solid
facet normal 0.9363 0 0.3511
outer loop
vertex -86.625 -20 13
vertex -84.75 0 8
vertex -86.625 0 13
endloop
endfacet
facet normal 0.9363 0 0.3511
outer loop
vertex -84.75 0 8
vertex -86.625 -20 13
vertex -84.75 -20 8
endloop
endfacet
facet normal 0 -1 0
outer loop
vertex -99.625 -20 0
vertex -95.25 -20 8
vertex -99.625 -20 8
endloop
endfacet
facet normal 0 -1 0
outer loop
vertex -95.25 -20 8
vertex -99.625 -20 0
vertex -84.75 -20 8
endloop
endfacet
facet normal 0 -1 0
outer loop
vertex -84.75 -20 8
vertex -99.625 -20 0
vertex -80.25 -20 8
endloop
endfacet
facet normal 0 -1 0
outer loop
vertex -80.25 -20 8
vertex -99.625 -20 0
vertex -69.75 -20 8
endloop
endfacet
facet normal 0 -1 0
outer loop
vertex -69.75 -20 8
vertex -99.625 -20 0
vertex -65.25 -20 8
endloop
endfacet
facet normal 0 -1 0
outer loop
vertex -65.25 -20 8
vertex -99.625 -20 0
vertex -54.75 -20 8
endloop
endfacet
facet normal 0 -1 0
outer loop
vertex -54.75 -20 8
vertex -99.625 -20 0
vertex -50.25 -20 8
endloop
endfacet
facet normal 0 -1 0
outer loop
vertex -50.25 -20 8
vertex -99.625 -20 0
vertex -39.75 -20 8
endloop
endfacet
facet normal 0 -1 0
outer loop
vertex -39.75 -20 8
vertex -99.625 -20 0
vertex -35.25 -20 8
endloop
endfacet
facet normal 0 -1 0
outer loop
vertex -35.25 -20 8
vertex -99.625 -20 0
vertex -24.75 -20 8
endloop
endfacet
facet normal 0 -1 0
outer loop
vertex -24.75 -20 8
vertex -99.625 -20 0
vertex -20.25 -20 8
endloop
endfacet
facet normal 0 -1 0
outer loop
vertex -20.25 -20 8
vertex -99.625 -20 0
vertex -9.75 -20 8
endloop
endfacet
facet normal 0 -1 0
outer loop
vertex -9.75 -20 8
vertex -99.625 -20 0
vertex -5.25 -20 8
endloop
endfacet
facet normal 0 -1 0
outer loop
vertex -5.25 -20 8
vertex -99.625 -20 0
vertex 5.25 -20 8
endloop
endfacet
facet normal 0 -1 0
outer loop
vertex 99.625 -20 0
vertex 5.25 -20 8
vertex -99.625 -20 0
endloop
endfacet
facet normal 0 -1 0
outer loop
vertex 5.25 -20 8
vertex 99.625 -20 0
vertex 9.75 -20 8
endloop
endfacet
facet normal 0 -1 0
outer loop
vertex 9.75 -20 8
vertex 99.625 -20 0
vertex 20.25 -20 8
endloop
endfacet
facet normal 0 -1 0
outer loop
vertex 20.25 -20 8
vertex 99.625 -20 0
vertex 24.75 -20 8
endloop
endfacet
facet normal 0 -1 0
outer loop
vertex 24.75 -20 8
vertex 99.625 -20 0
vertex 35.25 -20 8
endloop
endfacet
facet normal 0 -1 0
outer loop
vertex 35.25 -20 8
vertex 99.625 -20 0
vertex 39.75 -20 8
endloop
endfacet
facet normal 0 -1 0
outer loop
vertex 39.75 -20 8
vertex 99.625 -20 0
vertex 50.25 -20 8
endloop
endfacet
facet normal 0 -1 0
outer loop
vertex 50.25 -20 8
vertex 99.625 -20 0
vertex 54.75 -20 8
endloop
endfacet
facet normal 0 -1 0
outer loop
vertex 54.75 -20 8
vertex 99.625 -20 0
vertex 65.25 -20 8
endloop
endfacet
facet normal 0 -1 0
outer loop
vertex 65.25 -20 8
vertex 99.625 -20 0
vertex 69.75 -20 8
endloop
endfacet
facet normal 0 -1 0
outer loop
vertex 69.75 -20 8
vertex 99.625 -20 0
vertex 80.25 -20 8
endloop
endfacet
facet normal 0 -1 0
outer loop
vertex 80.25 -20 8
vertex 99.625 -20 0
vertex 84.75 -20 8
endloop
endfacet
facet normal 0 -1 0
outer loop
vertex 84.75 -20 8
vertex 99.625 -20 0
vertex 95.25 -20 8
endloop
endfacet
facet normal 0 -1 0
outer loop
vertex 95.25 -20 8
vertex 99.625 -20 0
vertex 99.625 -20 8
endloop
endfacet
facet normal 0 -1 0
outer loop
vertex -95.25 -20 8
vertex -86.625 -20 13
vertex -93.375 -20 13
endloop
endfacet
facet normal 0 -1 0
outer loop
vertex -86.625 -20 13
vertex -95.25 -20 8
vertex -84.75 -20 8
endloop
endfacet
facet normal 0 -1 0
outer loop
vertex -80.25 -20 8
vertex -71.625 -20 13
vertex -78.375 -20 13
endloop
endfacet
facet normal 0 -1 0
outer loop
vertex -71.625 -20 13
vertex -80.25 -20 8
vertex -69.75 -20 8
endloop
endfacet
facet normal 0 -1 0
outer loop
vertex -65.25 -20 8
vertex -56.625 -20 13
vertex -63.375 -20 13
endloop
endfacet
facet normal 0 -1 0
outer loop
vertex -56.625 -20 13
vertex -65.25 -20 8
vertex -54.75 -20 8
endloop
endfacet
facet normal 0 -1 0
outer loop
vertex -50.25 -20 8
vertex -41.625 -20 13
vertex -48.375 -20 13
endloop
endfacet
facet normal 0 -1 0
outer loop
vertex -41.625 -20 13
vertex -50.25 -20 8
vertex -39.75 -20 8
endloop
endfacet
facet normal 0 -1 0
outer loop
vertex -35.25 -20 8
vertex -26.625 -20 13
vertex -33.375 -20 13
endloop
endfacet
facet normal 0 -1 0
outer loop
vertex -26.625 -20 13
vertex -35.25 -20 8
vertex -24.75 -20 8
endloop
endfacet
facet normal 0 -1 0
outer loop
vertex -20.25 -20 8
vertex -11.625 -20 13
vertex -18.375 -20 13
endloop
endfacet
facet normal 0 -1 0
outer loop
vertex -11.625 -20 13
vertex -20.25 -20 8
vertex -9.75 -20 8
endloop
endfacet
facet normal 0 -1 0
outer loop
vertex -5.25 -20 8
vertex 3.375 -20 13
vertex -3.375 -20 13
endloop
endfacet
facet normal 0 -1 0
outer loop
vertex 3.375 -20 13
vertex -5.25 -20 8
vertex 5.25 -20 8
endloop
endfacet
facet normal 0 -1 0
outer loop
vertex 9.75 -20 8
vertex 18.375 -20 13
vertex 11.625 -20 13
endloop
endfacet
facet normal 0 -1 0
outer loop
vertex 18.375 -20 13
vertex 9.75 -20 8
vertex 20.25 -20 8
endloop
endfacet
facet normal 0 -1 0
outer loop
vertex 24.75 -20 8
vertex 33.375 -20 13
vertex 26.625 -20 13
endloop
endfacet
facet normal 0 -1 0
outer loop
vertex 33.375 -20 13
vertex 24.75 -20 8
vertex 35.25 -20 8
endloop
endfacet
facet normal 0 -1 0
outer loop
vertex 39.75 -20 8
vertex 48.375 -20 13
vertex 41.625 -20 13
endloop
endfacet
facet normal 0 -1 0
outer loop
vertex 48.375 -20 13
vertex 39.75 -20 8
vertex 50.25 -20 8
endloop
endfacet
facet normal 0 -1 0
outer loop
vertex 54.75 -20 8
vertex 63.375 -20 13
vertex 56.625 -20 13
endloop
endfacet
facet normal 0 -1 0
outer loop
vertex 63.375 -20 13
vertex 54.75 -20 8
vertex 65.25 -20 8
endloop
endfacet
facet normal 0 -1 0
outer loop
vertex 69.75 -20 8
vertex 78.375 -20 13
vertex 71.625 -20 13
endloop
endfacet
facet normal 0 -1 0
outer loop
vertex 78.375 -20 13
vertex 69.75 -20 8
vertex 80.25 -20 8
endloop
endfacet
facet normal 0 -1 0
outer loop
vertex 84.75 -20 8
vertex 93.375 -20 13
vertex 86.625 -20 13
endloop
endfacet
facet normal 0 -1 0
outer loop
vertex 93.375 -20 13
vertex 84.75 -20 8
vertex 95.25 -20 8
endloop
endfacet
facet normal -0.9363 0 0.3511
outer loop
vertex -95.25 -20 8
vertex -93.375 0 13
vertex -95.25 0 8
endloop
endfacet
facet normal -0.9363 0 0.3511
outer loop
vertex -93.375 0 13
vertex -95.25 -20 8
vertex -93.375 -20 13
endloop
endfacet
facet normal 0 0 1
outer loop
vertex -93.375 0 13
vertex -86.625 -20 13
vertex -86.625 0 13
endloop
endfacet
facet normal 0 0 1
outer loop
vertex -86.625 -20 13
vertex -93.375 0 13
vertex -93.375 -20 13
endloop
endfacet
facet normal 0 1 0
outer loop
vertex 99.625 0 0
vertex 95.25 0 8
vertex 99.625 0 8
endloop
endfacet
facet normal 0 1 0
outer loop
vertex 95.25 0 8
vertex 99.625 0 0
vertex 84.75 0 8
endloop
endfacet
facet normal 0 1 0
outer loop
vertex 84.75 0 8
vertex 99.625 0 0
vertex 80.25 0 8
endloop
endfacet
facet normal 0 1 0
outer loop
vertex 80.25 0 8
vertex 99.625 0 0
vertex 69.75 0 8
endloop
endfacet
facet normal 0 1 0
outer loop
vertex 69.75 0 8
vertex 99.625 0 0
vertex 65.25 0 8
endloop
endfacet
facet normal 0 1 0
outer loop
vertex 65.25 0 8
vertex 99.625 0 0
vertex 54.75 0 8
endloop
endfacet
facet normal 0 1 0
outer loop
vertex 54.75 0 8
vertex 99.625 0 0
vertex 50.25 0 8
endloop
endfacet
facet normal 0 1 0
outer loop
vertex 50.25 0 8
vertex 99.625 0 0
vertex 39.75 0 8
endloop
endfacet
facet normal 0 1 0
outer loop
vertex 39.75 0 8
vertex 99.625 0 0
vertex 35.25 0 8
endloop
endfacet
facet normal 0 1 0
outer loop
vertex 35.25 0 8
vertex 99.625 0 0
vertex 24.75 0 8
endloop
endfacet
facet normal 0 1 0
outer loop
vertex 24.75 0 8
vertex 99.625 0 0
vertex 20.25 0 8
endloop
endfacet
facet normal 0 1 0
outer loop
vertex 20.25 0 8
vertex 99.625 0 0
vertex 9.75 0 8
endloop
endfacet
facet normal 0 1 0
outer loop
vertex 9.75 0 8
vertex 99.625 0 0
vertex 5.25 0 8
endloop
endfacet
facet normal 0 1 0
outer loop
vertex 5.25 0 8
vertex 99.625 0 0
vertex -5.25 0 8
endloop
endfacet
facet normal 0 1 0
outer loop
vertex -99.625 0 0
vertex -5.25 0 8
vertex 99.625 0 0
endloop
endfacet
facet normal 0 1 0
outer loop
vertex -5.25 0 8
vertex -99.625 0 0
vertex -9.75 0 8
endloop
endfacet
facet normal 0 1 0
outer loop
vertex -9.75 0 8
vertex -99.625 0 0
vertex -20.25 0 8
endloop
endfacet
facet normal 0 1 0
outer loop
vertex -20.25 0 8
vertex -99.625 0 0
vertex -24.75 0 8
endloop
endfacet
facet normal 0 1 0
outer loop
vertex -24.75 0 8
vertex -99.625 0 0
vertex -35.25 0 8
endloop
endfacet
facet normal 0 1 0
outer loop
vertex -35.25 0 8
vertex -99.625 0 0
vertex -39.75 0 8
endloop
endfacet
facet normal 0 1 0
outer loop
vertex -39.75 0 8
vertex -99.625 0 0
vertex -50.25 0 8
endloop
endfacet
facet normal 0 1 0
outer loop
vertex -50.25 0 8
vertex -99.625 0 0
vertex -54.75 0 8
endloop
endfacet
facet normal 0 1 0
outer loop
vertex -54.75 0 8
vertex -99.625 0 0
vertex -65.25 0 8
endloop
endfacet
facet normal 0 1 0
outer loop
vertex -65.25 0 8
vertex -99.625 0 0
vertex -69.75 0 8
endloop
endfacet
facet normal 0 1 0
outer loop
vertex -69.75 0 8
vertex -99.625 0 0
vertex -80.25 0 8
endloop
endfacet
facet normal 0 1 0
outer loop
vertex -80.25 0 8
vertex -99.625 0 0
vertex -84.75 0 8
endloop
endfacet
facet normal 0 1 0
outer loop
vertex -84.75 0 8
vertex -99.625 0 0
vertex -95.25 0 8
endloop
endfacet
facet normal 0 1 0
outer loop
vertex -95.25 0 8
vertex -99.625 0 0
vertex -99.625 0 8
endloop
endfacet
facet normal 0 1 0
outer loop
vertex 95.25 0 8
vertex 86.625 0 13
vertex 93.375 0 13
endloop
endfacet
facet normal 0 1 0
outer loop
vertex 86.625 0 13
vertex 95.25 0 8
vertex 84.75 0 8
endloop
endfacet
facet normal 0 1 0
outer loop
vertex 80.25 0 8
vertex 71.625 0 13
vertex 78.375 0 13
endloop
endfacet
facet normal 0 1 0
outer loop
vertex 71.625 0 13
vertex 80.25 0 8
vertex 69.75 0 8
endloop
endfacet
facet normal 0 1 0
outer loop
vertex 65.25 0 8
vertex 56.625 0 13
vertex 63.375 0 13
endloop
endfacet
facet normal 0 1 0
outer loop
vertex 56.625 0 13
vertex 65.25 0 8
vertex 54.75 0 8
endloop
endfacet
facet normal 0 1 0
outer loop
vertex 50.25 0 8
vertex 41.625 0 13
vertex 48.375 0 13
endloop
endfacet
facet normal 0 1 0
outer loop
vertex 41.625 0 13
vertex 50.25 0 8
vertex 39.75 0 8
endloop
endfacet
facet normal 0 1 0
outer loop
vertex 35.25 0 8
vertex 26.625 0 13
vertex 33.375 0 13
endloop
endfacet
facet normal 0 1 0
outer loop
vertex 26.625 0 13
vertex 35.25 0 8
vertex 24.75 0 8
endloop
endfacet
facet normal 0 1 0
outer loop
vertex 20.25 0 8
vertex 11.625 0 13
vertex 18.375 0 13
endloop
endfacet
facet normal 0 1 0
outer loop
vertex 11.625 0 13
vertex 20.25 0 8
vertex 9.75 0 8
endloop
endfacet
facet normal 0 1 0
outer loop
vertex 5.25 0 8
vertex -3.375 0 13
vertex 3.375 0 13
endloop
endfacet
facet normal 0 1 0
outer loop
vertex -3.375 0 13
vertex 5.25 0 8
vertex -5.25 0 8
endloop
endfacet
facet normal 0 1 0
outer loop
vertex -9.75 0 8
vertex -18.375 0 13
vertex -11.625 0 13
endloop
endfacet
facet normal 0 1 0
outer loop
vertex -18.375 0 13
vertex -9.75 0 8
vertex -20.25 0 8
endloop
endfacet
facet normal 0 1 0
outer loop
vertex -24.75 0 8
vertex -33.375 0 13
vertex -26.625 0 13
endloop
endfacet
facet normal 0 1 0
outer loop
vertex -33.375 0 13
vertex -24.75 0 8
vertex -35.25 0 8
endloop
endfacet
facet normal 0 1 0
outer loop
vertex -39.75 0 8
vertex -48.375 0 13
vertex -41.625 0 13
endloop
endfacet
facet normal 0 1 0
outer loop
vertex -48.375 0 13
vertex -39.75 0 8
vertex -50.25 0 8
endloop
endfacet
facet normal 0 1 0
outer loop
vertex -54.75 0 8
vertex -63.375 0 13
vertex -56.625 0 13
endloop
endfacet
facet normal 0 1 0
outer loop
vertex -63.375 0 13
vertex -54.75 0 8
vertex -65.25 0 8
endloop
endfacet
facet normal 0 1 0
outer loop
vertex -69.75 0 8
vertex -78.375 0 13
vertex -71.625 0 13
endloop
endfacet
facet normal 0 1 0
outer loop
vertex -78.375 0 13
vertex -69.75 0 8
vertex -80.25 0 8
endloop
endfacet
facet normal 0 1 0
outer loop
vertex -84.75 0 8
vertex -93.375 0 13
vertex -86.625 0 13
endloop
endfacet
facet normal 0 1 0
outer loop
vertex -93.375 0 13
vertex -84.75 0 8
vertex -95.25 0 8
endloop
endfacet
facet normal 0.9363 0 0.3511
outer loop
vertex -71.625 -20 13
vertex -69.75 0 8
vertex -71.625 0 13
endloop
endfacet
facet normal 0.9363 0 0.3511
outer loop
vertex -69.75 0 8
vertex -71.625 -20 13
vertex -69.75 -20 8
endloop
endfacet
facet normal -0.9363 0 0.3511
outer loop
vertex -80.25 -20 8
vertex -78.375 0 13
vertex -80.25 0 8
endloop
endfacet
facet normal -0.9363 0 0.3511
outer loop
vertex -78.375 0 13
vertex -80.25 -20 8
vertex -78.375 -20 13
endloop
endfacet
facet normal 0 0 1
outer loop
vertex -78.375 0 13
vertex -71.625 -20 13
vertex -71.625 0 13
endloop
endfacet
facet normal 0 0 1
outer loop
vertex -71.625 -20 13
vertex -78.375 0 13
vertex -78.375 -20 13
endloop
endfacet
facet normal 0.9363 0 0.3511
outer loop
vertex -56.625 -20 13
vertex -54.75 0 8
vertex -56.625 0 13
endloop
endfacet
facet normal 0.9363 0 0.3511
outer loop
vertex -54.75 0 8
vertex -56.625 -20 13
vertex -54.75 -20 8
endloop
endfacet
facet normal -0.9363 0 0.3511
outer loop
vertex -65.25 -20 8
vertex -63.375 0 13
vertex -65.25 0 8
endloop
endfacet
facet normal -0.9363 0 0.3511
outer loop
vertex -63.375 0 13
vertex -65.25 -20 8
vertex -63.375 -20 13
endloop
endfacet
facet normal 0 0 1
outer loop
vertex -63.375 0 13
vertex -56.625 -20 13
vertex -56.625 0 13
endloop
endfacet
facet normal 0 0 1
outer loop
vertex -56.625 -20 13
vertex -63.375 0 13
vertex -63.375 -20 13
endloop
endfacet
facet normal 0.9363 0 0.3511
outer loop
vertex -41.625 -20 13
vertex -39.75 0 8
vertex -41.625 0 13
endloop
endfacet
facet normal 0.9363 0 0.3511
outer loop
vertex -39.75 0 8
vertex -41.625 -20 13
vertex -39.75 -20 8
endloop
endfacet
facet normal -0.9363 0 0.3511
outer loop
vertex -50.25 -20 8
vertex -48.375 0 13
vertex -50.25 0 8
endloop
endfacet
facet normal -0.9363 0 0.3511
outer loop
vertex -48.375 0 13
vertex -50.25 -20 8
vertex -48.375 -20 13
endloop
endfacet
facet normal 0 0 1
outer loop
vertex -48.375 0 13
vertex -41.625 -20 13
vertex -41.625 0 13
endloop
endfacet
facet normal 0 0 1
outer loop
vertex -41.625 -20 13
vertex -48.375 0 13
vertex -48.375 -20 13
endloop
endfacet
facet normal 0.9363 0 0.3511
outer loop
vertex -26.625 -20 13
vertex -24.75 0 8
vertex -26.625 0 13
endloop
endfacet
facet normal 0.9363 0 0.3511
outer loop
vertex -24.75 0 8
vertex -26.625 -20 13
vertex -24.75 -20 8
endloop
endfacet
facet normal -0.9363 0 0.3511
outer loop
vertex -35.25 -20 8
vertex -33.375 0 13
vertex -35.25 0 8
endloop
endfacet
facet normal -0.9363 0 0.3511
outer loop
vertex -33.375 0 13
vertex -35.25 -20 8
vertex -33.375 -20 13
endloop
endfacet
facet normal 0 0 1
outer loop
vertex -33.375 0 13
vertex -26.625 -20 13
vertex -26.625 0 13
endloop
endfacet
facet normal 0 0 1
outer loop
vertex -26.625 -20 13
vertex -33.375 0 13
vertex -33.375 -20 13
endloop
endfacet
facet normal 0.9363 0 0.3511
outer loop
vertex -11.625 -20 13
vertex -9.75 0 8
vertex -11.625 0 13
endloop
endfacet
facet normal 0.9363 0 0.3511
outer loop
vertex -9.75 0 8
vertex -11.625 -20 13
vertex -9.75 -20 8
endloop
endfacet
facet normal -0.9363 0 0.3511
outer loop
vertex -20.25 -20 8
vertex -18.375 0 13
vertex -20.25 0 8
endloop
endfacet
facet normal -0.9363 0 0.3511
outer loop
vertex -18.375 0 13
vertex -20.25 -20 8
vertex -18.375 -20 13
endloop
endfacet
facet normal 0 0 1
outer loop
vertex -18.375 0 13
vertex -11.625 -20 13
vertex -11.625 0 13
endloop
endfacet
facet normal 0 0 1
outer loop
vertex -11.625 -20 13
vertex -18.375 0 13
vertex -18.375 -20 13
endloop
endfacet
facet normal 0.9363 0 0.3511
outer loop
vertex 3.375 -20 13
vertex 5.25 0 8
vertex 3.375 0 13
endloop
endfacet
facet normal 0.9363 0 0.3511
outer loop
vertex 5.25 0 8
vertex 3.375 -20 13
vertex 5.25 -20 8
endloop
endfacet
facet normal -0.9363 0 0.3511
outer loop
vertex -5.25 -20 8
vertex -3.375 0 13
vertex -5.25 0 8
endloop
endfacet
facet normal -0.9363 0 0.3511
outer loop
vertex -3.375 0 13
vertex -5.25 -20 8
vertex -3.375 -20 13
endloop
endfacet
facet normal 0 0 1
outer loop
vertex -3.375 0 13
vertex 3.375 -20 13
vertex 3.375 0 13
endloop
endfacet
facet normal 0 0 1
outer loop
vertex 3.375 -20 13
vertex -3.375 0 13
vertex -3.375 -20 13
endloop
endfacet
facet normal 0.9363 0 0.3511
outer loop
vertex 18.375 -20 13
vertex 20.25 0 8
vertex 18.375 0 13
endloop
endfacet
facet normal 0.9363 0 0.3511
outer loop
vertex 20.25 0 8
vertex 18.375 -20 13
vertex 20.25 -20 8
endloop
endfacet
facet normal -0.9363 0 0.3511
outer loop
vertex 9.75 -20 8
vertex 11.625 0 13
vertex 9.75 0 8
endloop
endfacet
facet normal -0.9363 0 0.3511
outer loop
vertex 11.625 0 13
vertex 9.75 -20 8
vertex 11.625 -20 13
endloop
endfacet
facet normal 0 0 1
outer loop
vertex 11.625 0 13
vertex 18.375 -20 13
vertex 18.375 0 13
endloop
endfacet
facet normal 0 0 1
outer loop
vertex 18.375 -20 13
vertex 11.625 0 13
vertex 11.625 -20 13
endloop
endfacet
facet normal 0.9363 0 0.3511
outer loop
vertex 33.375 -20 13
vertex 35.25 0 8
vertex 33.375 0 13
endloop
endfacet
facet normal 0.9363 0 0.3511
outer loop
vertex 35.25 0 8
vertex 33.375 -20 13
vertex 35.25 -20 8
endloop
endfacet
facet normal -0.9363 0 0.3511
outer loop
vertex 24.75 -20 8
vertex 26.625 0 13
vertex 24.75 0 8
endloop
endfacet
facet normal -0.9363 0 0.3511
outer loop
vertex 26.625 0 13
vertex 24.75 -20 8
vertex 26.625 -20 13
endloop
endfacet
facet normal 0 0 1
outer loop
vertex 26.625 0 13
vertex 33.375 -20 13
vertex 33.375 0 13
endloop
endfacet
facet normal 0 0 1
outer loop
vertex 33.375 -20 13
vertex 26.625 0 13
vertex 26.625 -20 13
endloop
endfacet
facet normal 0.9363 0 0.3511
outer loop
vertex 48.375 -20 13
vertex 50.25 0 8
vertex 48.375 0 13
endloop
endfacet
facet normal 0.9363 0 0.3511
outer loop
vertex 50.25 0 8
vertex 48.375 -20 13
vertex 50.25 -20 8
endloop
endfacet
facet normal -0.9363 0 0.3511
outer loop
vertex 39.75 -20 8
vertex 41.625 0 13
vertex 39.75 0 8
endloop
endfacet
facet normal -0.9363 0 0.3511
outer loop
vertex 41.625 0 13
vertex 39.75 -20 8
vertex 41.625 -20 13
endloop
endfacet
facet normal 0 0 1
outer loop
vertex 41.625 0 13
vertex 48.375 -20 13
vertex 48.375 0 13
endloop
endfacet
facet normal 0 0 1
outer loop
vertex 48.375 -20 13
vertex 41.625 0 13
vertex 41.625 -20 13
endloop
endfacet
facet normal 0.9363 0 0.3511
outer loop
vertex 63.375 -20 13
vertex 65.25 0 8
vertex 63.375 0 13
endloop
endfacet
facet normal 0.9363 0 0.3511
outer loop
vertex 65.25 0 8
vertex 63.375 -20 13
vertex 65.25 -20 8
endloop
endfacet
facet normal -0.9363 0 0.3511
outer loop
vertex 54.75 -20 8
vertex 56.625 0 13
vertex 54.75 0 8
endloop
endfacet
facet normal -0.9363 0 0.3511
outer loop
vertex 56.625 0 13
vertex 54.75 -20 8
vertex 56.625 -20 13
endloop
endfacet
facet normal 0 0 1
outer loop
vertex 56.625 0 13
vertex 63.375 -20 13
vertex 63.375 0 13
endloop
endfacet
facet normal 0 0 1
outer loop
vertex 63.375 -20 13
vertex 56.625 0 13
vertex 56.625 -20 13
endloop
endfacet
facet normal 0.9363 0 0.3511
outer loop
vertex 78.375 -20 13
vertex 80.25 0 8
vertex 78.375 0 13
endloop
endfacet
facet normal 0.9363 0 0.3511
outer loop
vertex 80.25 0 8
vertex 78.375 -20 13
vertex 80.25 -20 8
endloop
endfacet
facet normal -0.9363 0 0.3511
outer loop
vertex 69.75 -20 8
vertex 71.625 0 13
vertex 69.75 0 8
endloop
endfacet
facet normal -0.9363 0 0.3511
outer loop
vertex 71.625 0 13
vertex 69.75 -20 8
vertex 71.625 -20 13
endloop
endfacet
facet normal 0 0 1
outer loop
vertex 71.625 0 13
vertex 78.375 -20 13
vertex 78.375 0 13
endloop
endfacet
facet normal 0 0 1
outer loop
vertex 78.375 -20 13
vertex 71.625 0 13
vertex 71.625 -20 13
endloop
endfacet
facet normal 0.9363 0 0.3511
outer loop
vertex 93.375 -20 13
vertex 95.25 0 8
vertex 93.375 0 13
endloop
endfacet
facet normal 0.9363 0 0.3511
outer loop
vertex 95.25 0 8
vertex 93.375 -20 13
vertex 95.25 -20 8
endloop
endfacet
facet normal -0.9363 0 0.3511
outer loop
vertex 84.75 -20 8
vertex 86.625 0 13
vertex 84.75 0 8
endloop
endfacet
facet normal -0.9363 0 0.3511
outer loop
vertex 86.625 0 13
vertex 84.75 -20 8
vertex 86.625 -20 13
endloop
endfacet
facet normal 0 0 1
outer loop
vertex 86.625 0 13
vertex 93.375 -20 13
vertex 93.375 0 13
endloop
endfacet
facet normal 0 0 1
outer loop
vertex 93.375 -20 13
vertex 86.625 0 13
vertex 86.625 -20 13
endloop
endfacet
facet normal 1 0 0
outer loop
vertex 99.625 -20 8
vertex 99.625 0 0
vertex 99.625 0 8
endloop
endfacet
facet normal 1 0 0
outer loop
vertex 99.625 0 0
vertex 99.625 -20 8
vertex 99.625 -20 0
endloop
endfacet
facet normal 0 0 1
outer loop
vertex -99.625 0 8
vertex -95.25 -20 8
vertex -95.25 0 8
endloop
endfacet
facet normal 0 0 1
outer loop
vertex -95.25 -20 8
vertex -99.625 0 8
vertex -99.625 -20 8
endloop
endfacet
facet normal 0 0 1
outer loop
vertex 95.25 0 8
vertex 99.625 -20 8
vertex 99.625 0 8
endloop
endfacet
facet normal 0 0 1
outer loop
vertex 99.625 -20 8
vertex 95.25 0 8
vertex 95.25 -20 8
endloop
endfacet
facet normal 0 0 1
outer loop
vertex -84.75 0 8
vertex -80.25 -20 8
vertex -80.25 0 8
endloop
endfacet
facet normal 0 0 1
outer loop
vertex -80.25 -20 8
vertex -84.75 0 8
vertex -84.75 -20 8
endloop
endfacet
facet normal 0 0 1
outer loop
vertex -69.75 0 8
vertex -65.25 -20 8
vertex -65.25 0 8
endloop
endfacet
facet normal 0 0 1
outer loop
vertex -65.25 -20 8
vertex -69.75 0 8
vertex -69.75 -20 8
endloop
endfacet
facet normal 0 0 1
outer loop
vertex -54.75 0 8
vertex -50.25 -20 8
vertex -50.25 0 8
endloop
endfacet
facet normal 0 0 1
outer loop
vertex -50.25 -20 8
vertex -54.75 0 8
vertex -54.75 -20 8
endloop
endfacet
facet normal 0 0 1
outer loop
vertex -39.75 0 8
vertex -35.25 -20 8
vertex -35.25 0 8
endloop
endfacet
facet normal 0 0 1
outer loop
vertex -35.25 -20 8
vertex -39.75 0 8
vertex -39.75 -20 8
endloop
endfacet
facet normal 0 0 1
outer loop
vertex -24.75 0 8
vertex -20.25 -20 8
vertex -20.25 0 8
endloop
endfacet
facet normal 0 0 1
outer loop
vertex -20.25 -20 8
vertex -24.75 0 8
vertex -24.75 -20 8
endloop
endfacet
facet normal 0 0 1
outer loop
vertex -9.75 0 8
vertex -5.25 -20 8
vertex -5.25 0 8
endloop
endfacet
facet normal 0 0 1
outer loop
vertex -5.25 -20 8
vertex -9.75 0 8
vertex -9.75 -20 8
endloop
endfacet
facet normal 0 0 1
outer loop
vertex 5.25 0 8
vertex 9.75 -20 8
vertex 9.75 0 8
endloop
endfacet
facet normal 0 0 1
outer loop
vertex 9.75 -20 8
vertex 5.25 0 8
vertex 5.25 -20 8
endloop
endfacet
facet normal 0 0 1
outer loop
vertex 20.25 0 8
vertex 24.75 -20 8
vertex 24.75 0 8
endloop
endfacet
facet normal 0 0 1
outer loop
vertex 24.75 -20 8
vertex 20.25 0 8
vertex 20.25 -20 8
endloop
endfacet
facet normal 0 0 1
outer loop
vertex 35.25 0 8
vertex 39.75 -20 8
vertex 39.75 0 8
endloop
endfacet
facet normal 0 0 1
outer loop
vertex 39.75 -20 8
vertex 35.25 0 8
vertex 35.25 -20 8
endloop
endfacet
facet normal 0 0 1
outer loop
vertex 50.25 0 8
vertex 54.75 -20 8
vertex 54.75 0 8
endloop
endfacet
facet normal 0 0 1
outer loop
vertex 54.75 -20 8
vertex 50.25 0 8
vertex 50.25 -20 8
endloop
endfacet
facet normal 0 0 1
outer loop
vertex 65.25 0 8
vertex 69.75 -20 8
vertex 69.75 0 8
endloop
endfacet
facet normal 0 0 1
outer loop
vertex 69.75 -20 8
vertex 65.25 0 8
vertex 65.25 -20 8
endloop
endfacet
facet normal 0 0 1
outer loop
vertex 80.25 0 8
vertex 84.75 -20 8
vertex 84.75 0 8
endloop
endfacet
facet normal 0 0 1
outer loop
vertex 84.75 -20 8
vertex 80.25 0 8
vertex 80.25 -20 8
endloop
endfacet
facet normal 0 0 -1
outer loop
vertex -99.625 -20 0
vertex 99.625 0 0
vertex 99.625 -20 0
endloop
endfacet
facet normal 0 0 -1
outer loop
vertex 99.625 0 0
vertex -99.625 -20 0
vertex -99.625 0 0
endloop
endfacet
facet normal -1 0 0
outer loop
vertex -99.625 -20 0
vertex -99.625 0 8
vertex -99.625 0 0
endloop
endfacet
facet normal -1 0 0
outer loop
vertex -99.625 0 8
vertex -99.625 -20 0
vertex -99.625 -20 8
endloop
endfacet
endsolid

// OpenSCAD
$fn = 32;

// ----------------------------------------------------------------------
// Toothed rack, 13 teeth
// 15 mm pitch, 5 mm teeth
// ----------------------------------------------------------------------

// --- parameters (mm) ---
bar_w = 20;      // bar width (Y)
bar_h = 8;       // bar height (Z)
teeth = 13;      // number of teeth
pitch = 15;      // tooth pitch
tooth_h = 5;     // tooth height above the bar
root_w = 11.25;  // tooth width at the root
crest_w = 6.75;  // tooth width at the crest

// --- derived feature positions (mm) ---
span = (teeth - 1) * pitch;  // = 180   distance between the outer teeth
bar_l = span + root_w + 8;   // = 199.25   bar length: teeth plus 4 mm at each end
tooth_x = -span / 2;         // = -90   X of the first tooth
height = bar_h + tooth_h;    // = 13   overall height
feature_centers = [
  [tooth_x + 0 * pitch, -bar_w / 2],
  [tooth_x + 1 * pitch, -bar_w / 2],
  [tooth_x + 2 * pitch, -bar_w / 2],
  [tooth_x + 3 * pitch, -bar_w / 2],
  [tooth_x + 4 * pitch, -bar_w / 2],
  [tooth_x + 5 * pitch, -bar_w / 2],
  [tooth_x + 6 * pitch, -bar_w / 2],
  [tooth_x + 7 * pitch, -bar_w / 2],
  [tooth_x + 8 * pitch, -bar_w / 2],
  [tooth_x + 9 * pitch, -bar_w / 2],
  [tooth_x + 10 * pitch, -bar_w / 2],
  [tooth_x + 11 * pitch, -bar_w / 2],
  [tooth_x + 12 * pitch, -bar_w / 2]
];   // tooth centre line, drives the tooth loop

// bar with a rack of teeth, one extruded trapezoium per centre
module rack_tooth() {
  linear_extrude(height = bar_w)
    polygon(points = [
      [0, 0],
      [root_w, 0],
      [root_w / 2 + crest_w / 2, tooth_h + 1],
      [root_w / 2 - crest_w / 2, tooth_h + 1]
    ]);
}

union() {
  translate([-bar_l / 2, -bar_w, 0]) cube([bar_l, bar_w, bar_h]);
  for (centre = feature_centers)
    translate([centre[0] - root_w / 2, 0, bar_h - 1]) rotate([90, 0, 0]) rack_tooth();
}
